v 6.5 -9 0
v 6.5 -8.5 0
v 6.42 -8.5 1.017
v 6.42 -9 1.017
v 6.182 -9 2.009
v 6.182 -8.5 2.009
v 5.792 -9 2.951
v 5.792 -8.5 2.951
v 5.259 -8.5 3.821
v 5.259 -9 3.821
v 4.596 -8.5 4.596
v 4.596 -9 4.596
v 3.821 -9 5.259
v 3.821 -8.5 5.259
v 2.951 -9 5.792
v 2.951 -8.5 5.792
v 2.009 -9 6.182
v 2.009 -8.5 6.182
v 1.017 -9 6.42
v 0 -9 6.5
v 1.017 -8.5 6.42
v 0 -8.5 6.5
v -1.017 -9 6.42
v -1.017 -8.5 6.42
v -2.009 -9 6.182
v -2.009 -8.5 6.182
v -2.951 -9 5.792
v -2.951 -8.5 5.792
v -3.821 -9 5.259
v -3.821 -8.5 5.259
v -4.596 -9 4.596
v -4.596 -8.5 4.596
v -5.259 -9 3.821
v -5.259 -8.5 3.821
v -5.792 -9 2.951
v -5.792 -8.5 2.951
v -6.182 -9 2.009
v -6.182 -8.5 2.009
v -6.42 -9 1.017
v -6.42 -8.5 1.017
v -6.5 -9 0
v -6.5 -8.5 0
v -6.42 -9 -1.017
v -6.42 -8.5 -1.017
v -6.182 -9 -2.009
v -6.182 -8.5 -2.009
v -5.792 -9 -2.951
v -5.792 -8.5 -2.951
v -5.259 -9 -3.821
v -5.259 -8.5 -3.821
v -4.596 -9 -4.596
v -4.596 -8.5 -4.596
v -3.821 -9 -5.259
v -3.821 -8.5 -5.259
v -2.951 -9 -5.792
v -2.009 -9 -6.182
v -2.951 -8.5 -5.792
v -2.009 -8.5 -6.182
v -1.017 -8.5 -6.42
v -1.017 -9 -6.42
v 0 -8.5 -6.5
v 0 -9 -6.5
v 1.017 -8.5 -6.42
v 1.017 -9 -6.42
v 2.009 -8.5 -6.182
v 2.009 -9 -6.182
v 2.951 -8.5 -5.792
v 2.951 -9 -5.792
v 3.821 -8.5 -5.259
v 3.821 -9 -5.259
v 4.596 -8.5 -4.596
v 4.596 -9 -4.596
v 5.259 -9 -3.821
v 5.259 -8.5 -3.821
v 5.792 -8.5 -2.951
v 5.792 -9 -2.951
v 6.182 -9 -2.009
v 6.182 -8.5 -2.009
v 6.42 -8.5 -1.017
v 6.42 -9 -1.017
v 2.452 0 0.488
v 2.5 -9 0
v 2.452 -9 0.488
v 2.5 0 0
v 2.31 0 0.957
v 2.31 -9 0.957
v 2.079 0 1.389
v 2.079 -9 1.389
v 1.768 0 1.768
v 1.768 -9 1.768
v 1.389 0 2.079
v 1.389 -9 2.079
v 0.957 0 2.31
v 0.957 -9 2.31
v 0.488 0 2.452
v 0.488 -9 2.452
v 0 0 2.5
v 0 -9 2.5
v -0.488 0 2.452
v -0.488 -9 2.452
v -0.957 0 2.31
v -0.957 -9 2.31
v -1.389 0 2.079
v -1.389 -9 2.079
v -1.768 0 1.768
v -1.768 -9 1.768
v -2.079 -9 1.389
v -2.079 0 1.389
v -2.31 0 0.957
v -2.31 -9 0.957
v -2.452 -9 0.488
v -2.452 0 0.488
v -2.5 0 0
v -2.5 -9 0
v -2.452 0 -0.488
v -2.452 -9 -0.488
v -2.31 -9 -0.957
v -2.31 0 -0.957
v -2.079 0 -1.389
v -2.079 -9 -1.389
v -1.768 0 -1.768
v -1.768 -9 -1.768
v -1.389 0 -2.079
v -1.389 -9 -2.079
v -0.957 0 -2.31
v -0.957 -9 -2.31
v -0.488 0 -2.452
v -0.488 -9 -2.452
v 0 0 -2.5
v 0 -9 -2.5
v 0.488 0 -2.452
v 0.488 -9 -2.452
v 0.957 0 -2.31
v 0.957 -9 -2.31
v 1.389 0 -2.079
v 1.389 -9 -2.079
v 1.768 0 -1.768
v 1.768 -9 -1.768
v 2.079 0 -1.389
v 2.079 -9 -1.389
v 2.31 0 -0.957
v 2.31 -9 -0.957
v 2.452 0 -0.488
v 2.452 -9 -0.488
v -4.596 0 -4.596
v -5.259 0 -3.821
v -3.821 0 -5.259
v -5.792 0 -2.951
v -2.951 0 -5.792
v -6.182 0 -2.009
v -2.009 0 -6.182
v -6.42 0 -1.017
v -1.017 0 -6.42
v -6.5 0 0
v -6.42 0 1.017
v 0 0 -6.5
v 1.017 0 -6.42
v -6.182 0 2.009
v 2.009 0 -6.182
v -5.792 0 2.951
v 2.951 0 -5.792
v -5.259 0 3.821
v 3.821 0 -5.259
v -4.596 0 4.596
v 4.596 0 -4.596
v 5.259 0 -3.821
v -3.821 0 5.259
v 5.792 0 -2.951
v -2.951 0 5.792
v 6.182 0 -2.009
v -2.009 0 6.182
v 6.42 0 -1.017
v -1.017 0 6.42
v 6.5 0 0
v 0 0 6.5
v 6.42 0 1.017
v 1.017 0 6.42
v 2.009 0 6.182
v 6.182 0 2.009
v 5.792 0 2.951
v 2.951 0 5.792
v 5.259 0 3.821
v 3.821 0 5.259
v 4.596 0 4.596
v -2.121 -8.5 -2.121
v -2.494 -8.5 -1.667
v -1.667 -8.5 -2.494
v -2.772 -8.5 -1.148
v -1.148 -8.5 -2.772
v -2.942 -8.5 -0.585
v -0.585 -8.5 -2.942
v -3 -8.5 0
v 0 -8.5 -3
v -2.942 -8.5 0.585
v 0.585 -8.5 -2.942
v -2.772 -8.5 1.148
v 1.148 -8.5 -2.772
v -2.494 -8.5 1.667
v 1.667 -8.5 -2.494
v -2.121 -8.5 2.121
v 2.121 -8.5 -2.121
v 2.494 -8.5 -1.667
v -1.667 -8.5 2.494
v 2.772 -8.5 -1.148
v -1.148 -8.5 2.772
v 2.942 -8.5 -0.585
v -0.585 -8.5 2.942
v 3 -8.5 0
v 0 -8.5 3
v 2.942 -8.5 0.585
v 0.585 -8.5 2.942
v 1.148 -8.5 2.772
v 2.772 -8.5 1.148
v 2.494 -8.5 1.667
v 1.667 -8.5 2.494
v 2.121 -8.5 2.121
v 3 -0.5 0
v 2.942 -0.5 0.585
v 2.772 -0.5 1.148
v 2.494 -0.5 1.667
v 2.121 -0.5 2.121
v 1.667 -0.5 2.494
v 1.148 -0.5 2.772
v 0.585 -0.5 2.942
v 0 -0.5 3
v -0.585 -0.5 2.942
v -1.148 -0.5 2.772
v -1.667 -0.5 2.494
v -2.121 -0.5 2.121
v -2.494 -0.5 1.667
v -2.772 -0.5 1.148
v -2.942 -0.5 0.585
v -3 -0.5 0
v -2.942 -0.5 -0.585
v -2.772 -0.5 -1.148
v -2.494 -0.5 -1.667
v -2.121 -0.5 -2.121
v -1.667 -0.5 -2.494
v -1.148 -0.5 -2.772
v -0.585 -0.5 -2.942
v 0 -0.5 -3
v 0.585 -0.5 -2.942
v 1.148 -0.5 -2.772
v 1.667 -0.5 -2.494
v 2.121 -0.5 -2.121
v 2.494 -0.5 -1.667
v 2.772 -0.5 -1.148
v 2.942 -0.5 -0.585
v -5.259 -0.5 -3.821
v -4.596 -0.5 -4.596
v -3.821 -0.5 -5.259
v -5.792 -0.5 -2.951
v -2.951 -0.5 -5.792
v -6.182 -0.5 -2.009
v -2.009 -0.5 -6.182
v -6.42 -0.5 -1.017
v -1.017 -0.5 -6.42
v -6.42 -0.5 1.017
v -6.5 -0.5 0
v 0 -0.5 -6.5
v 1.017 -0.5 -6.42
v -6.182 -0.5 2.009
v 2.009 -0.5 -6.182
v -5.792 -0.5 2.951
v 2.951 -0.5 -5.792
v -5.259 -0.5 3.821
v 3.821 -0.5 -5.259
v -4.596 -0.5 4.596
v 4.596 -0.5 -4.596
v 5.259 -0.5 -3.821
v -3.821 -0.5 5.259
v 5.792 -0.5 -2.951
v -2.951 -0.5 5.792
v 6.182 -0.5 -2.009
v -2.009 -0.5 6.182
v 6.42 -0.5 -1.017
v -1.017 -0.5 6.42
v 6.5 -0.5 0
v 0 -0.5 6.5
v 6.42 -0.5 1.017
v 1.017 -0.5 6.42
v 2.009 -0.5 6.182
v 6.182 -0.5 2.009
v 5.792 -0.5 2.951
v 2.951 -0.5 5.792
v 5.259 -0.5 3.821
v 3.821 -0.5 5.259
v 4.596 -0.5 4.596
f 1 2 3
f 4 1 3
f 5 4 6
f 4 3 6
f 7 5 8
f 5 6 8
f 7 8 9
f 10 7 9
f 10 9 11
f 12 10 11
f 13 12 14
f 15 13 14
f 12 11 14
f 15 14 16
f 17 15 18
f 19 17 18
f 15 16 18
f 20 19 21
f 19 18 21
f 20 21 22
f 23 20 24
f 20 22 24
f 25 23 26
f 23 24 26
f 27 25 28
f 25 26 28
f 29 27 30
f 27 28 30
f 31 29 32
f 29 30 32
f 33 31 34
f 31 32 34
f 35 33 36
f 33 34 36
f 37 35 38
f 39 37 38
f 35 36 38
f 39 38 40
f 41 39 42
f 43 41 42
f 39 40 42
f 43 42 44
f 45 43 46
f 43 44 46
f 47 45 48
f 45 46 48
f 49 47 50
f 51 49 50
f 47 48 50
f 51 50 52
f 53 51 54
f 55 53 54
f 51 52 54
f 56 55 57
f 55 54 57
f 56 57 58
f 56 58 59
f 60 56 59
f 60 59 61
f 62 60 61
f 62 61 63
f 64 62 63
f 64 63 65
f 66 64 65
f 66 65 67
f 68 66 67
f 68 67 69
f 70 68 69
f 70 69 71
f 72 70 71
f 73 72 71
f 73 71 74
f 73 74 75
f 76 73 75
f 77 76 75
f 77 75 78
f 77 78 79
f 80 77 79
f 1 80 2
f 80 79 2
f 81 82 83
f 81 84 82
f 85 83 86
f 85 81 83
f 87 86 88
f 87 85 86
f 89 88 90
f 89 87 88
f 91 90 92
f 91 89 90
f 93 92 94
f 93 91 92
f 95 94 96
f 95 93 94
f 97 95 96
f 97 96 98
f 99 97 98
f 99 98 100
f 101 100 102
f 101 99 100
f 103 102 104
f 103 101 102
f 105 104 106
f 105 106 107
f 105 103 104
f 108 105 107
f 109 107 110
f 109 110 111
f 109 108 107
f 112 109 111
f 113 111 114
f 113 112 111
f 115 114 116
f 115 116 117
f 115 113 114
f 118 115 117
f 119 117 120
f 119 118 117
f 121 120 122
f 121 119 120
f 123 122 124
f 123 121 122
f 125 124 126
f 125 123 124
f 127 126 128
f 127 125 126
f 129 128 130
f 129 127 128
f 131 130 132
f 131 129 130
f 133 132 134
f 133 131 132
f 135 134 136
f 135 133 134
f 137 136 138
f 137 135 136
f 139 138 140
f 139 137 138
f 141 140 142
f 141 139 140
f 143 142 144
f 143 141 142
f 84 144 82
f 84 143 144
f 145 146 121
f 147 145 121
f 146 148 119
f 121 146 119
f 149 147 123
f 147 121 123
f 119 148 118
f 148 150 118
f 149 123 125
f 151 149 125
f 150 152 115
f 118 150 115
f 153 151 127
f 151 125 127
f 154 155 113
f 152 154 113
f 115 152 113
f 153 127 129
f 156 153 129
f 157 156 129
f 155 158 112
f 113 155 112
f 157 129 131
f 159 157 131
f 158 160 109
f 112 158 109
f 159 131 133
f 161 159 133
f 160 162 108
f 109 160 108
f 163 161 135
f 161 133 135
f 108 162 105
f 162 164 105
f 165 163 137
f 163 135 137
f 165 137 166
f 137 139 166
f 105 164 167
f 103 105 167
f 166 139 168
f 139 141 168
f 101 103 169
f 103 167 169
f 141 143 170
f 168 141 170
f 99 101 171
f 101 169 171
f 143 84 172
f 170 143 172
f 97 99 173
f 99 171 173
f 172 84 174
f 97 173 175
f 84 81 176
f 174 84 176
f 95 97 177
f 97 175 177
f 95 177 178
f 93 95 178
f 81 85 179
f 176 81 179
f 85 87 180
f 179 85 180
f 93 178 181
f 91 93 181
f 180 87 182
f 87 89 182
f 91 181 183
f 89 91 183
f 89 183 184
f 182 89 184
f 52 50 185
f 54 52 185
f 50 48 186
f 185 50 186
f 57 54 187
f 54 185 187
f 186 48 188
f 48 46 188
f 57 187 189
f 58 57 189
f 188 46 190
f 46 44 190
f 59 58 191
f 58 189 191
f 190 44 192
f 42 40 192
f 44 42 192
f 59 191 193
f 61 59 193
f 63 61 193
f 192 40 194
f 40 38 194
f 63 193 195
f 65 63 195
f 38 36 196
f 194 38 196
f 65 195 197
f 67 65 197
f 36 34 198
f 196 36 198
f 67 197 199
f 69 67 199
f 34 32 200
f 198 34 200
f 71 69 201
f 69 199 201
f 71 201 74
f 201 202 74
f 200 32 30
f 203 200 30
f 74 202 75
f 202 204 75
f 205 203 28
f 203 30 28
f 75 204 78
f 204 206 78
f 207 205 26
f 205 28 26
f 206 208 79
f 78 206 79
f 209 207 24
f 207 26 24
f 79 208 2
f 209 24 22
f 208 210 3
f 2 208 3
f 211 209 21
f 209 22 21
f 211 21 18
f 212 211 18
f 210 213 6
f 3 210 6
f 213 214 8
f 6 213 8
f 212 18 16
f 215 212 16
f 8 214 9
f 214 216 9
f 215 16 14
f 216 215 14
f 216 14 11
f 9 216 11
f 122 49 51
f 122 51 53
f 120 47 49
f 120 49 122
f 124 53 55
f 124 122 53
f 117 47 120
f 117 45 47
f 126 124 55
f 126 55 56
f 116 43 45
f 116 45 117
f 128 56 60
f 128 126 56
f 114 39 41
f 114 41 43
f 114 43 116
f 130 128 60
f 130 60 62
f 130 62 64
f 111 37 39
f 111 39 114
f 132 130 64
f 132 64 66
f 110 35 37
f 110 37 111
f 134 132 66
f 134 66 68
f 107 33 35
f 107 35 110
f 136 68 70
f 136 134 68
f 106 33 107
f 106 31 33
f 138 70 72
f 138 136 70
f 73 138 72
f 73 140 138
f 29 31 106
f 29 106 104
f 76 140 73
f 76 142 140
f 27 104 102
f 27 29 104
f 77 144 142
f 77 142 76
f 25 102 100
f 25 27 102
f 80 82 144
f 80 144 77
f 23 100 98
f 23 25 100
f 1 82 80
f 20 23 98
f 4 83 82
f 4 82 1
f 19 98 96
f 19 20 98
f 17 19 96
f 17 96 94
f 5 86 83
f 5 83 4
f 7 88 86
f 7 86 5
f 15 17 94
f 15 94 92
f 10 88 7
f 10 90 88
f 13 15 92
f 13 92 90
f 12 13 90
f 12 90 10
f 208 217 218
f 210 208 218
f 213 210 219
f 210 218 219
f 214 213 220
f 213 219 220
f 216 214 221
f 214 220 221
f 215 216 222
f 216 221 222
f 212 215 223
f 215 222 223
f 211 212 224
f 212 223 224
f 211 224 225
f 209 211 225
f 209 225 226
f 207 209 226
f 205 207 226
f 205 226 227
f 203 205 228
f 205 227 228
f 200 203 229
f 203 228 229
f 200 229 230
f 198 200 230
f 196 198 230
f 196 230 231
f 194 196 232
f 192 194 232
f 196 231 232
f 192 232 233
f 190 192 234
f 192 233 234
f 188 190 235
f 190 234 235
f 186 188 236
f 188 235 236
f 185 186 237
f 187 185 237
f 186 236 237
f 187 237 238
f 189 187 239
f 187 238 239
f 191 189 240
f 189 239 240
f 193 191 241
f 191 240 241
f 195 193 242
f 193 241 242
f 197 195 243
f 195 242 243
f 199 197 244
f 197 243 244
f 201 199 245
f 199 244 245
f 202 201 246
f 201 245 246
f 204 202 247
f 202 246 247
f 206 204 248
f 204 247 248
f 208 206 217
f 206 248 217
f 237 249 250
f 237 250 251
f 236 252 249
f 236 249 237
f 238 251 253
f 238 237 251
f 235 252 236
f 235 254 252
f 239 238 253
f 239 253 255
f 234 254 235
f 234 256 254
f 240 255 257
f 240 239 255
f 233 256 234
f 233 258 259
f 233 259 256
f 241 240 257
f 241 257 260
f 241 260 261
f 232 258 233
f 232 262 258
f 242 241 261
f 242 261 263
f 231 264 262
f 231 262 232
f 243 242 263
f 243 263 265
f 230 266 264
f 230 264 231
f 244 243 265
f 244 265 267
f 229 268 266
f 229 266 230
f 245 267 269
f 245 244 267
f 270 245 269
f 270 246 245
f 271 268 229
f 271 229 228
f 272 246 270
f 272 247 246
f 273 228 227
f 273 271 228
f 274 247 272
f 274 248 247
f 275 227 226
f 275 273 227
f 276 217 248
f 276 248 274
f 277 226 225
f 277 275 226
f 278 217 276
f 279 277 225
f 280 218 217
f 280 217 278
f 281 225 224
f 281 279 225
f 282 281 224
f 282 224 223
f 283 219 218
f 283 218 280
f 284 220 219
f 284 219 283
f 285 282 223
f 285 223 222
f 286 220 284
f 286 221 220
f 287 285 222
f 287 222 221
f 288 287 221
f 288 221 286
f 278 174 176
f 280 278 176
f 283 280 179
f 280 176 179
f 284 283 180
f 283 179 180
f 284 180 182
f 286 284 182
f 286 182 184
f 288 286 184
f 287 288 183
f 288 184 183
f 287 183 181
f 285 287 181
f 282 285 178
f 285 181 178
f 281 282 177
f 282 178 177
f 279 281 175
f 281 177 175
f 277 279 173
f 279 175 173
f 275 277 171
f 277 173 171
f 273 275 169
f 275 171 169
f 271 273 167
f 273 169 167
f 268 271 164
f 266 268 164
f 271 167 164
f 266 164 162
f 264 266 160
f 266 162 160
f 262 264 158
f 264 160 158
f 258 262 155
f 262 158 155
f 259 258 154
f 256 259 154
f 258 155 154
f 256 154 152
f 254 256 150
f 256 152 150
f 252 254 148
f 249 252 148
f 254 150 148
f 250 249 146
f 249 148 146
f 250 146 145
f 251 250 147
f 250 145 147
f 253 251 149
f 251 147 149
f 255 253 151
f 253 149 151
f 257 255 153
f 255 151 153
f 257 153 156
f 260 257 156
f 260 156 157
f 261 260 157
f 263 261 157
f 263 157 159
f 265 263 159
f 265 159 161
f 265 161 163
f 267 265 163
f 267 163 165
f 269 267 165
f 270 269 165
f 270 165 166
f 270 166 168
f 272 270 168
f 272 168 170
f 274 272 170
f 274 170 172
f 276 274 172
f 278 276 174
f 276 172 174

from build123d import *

# Parameters (mm, degrees)
F0_R     = 6.5
F0_R_2   = 2.5
F1_DEPTH = 0.5
F2_R     = 3
F2_R_2   = 2.5
F3_DEPTH = 8
F4_R     = 6.5
F4_R_2   = 2.5
F5_DEPTH = 0.5
F7_R     = 6.5
F7_R_2   = 2.5
F8_DEPTH = 0.5


with BuildPart() as f1:
    # F0 (on Front) → F1 (new body)
    with BuildSketch(Plane.XZ):
        Circle(F0_R)
        Circle(F0_R_2, mode=Mode.SUBTRACT)
    extrude(amount=F1_DEPTH)

    # F2 (on face) → F3 (join)
    with BuildSketch(Plane.XZ.offset(0.5)):
        Circle(F2_R)
        Circle(F2_R_2, mode=Mode.SUBTRACT)
    extrude(amount=F3_DEPTH)

    # F7 (on face) → F8 (join)
    with BuildSketch(Plane.XZ.offset(8.5)):
        Circle(F7_R)
        Circle(F7_R_2, mode=Mode.SUBTRACT)
    extrude(amount=F8_DEPTH)


with BuildPart() as f5:
    # F4 (on face) → F5 (new body)
    with BuildSketch(Plane.XZ):
        Circle(F4_R)
        Circle(F4_R_2, mode=Mode.SUBTRACT)
    extrude(amount=F5_DEPTH)


solid = f1.part
